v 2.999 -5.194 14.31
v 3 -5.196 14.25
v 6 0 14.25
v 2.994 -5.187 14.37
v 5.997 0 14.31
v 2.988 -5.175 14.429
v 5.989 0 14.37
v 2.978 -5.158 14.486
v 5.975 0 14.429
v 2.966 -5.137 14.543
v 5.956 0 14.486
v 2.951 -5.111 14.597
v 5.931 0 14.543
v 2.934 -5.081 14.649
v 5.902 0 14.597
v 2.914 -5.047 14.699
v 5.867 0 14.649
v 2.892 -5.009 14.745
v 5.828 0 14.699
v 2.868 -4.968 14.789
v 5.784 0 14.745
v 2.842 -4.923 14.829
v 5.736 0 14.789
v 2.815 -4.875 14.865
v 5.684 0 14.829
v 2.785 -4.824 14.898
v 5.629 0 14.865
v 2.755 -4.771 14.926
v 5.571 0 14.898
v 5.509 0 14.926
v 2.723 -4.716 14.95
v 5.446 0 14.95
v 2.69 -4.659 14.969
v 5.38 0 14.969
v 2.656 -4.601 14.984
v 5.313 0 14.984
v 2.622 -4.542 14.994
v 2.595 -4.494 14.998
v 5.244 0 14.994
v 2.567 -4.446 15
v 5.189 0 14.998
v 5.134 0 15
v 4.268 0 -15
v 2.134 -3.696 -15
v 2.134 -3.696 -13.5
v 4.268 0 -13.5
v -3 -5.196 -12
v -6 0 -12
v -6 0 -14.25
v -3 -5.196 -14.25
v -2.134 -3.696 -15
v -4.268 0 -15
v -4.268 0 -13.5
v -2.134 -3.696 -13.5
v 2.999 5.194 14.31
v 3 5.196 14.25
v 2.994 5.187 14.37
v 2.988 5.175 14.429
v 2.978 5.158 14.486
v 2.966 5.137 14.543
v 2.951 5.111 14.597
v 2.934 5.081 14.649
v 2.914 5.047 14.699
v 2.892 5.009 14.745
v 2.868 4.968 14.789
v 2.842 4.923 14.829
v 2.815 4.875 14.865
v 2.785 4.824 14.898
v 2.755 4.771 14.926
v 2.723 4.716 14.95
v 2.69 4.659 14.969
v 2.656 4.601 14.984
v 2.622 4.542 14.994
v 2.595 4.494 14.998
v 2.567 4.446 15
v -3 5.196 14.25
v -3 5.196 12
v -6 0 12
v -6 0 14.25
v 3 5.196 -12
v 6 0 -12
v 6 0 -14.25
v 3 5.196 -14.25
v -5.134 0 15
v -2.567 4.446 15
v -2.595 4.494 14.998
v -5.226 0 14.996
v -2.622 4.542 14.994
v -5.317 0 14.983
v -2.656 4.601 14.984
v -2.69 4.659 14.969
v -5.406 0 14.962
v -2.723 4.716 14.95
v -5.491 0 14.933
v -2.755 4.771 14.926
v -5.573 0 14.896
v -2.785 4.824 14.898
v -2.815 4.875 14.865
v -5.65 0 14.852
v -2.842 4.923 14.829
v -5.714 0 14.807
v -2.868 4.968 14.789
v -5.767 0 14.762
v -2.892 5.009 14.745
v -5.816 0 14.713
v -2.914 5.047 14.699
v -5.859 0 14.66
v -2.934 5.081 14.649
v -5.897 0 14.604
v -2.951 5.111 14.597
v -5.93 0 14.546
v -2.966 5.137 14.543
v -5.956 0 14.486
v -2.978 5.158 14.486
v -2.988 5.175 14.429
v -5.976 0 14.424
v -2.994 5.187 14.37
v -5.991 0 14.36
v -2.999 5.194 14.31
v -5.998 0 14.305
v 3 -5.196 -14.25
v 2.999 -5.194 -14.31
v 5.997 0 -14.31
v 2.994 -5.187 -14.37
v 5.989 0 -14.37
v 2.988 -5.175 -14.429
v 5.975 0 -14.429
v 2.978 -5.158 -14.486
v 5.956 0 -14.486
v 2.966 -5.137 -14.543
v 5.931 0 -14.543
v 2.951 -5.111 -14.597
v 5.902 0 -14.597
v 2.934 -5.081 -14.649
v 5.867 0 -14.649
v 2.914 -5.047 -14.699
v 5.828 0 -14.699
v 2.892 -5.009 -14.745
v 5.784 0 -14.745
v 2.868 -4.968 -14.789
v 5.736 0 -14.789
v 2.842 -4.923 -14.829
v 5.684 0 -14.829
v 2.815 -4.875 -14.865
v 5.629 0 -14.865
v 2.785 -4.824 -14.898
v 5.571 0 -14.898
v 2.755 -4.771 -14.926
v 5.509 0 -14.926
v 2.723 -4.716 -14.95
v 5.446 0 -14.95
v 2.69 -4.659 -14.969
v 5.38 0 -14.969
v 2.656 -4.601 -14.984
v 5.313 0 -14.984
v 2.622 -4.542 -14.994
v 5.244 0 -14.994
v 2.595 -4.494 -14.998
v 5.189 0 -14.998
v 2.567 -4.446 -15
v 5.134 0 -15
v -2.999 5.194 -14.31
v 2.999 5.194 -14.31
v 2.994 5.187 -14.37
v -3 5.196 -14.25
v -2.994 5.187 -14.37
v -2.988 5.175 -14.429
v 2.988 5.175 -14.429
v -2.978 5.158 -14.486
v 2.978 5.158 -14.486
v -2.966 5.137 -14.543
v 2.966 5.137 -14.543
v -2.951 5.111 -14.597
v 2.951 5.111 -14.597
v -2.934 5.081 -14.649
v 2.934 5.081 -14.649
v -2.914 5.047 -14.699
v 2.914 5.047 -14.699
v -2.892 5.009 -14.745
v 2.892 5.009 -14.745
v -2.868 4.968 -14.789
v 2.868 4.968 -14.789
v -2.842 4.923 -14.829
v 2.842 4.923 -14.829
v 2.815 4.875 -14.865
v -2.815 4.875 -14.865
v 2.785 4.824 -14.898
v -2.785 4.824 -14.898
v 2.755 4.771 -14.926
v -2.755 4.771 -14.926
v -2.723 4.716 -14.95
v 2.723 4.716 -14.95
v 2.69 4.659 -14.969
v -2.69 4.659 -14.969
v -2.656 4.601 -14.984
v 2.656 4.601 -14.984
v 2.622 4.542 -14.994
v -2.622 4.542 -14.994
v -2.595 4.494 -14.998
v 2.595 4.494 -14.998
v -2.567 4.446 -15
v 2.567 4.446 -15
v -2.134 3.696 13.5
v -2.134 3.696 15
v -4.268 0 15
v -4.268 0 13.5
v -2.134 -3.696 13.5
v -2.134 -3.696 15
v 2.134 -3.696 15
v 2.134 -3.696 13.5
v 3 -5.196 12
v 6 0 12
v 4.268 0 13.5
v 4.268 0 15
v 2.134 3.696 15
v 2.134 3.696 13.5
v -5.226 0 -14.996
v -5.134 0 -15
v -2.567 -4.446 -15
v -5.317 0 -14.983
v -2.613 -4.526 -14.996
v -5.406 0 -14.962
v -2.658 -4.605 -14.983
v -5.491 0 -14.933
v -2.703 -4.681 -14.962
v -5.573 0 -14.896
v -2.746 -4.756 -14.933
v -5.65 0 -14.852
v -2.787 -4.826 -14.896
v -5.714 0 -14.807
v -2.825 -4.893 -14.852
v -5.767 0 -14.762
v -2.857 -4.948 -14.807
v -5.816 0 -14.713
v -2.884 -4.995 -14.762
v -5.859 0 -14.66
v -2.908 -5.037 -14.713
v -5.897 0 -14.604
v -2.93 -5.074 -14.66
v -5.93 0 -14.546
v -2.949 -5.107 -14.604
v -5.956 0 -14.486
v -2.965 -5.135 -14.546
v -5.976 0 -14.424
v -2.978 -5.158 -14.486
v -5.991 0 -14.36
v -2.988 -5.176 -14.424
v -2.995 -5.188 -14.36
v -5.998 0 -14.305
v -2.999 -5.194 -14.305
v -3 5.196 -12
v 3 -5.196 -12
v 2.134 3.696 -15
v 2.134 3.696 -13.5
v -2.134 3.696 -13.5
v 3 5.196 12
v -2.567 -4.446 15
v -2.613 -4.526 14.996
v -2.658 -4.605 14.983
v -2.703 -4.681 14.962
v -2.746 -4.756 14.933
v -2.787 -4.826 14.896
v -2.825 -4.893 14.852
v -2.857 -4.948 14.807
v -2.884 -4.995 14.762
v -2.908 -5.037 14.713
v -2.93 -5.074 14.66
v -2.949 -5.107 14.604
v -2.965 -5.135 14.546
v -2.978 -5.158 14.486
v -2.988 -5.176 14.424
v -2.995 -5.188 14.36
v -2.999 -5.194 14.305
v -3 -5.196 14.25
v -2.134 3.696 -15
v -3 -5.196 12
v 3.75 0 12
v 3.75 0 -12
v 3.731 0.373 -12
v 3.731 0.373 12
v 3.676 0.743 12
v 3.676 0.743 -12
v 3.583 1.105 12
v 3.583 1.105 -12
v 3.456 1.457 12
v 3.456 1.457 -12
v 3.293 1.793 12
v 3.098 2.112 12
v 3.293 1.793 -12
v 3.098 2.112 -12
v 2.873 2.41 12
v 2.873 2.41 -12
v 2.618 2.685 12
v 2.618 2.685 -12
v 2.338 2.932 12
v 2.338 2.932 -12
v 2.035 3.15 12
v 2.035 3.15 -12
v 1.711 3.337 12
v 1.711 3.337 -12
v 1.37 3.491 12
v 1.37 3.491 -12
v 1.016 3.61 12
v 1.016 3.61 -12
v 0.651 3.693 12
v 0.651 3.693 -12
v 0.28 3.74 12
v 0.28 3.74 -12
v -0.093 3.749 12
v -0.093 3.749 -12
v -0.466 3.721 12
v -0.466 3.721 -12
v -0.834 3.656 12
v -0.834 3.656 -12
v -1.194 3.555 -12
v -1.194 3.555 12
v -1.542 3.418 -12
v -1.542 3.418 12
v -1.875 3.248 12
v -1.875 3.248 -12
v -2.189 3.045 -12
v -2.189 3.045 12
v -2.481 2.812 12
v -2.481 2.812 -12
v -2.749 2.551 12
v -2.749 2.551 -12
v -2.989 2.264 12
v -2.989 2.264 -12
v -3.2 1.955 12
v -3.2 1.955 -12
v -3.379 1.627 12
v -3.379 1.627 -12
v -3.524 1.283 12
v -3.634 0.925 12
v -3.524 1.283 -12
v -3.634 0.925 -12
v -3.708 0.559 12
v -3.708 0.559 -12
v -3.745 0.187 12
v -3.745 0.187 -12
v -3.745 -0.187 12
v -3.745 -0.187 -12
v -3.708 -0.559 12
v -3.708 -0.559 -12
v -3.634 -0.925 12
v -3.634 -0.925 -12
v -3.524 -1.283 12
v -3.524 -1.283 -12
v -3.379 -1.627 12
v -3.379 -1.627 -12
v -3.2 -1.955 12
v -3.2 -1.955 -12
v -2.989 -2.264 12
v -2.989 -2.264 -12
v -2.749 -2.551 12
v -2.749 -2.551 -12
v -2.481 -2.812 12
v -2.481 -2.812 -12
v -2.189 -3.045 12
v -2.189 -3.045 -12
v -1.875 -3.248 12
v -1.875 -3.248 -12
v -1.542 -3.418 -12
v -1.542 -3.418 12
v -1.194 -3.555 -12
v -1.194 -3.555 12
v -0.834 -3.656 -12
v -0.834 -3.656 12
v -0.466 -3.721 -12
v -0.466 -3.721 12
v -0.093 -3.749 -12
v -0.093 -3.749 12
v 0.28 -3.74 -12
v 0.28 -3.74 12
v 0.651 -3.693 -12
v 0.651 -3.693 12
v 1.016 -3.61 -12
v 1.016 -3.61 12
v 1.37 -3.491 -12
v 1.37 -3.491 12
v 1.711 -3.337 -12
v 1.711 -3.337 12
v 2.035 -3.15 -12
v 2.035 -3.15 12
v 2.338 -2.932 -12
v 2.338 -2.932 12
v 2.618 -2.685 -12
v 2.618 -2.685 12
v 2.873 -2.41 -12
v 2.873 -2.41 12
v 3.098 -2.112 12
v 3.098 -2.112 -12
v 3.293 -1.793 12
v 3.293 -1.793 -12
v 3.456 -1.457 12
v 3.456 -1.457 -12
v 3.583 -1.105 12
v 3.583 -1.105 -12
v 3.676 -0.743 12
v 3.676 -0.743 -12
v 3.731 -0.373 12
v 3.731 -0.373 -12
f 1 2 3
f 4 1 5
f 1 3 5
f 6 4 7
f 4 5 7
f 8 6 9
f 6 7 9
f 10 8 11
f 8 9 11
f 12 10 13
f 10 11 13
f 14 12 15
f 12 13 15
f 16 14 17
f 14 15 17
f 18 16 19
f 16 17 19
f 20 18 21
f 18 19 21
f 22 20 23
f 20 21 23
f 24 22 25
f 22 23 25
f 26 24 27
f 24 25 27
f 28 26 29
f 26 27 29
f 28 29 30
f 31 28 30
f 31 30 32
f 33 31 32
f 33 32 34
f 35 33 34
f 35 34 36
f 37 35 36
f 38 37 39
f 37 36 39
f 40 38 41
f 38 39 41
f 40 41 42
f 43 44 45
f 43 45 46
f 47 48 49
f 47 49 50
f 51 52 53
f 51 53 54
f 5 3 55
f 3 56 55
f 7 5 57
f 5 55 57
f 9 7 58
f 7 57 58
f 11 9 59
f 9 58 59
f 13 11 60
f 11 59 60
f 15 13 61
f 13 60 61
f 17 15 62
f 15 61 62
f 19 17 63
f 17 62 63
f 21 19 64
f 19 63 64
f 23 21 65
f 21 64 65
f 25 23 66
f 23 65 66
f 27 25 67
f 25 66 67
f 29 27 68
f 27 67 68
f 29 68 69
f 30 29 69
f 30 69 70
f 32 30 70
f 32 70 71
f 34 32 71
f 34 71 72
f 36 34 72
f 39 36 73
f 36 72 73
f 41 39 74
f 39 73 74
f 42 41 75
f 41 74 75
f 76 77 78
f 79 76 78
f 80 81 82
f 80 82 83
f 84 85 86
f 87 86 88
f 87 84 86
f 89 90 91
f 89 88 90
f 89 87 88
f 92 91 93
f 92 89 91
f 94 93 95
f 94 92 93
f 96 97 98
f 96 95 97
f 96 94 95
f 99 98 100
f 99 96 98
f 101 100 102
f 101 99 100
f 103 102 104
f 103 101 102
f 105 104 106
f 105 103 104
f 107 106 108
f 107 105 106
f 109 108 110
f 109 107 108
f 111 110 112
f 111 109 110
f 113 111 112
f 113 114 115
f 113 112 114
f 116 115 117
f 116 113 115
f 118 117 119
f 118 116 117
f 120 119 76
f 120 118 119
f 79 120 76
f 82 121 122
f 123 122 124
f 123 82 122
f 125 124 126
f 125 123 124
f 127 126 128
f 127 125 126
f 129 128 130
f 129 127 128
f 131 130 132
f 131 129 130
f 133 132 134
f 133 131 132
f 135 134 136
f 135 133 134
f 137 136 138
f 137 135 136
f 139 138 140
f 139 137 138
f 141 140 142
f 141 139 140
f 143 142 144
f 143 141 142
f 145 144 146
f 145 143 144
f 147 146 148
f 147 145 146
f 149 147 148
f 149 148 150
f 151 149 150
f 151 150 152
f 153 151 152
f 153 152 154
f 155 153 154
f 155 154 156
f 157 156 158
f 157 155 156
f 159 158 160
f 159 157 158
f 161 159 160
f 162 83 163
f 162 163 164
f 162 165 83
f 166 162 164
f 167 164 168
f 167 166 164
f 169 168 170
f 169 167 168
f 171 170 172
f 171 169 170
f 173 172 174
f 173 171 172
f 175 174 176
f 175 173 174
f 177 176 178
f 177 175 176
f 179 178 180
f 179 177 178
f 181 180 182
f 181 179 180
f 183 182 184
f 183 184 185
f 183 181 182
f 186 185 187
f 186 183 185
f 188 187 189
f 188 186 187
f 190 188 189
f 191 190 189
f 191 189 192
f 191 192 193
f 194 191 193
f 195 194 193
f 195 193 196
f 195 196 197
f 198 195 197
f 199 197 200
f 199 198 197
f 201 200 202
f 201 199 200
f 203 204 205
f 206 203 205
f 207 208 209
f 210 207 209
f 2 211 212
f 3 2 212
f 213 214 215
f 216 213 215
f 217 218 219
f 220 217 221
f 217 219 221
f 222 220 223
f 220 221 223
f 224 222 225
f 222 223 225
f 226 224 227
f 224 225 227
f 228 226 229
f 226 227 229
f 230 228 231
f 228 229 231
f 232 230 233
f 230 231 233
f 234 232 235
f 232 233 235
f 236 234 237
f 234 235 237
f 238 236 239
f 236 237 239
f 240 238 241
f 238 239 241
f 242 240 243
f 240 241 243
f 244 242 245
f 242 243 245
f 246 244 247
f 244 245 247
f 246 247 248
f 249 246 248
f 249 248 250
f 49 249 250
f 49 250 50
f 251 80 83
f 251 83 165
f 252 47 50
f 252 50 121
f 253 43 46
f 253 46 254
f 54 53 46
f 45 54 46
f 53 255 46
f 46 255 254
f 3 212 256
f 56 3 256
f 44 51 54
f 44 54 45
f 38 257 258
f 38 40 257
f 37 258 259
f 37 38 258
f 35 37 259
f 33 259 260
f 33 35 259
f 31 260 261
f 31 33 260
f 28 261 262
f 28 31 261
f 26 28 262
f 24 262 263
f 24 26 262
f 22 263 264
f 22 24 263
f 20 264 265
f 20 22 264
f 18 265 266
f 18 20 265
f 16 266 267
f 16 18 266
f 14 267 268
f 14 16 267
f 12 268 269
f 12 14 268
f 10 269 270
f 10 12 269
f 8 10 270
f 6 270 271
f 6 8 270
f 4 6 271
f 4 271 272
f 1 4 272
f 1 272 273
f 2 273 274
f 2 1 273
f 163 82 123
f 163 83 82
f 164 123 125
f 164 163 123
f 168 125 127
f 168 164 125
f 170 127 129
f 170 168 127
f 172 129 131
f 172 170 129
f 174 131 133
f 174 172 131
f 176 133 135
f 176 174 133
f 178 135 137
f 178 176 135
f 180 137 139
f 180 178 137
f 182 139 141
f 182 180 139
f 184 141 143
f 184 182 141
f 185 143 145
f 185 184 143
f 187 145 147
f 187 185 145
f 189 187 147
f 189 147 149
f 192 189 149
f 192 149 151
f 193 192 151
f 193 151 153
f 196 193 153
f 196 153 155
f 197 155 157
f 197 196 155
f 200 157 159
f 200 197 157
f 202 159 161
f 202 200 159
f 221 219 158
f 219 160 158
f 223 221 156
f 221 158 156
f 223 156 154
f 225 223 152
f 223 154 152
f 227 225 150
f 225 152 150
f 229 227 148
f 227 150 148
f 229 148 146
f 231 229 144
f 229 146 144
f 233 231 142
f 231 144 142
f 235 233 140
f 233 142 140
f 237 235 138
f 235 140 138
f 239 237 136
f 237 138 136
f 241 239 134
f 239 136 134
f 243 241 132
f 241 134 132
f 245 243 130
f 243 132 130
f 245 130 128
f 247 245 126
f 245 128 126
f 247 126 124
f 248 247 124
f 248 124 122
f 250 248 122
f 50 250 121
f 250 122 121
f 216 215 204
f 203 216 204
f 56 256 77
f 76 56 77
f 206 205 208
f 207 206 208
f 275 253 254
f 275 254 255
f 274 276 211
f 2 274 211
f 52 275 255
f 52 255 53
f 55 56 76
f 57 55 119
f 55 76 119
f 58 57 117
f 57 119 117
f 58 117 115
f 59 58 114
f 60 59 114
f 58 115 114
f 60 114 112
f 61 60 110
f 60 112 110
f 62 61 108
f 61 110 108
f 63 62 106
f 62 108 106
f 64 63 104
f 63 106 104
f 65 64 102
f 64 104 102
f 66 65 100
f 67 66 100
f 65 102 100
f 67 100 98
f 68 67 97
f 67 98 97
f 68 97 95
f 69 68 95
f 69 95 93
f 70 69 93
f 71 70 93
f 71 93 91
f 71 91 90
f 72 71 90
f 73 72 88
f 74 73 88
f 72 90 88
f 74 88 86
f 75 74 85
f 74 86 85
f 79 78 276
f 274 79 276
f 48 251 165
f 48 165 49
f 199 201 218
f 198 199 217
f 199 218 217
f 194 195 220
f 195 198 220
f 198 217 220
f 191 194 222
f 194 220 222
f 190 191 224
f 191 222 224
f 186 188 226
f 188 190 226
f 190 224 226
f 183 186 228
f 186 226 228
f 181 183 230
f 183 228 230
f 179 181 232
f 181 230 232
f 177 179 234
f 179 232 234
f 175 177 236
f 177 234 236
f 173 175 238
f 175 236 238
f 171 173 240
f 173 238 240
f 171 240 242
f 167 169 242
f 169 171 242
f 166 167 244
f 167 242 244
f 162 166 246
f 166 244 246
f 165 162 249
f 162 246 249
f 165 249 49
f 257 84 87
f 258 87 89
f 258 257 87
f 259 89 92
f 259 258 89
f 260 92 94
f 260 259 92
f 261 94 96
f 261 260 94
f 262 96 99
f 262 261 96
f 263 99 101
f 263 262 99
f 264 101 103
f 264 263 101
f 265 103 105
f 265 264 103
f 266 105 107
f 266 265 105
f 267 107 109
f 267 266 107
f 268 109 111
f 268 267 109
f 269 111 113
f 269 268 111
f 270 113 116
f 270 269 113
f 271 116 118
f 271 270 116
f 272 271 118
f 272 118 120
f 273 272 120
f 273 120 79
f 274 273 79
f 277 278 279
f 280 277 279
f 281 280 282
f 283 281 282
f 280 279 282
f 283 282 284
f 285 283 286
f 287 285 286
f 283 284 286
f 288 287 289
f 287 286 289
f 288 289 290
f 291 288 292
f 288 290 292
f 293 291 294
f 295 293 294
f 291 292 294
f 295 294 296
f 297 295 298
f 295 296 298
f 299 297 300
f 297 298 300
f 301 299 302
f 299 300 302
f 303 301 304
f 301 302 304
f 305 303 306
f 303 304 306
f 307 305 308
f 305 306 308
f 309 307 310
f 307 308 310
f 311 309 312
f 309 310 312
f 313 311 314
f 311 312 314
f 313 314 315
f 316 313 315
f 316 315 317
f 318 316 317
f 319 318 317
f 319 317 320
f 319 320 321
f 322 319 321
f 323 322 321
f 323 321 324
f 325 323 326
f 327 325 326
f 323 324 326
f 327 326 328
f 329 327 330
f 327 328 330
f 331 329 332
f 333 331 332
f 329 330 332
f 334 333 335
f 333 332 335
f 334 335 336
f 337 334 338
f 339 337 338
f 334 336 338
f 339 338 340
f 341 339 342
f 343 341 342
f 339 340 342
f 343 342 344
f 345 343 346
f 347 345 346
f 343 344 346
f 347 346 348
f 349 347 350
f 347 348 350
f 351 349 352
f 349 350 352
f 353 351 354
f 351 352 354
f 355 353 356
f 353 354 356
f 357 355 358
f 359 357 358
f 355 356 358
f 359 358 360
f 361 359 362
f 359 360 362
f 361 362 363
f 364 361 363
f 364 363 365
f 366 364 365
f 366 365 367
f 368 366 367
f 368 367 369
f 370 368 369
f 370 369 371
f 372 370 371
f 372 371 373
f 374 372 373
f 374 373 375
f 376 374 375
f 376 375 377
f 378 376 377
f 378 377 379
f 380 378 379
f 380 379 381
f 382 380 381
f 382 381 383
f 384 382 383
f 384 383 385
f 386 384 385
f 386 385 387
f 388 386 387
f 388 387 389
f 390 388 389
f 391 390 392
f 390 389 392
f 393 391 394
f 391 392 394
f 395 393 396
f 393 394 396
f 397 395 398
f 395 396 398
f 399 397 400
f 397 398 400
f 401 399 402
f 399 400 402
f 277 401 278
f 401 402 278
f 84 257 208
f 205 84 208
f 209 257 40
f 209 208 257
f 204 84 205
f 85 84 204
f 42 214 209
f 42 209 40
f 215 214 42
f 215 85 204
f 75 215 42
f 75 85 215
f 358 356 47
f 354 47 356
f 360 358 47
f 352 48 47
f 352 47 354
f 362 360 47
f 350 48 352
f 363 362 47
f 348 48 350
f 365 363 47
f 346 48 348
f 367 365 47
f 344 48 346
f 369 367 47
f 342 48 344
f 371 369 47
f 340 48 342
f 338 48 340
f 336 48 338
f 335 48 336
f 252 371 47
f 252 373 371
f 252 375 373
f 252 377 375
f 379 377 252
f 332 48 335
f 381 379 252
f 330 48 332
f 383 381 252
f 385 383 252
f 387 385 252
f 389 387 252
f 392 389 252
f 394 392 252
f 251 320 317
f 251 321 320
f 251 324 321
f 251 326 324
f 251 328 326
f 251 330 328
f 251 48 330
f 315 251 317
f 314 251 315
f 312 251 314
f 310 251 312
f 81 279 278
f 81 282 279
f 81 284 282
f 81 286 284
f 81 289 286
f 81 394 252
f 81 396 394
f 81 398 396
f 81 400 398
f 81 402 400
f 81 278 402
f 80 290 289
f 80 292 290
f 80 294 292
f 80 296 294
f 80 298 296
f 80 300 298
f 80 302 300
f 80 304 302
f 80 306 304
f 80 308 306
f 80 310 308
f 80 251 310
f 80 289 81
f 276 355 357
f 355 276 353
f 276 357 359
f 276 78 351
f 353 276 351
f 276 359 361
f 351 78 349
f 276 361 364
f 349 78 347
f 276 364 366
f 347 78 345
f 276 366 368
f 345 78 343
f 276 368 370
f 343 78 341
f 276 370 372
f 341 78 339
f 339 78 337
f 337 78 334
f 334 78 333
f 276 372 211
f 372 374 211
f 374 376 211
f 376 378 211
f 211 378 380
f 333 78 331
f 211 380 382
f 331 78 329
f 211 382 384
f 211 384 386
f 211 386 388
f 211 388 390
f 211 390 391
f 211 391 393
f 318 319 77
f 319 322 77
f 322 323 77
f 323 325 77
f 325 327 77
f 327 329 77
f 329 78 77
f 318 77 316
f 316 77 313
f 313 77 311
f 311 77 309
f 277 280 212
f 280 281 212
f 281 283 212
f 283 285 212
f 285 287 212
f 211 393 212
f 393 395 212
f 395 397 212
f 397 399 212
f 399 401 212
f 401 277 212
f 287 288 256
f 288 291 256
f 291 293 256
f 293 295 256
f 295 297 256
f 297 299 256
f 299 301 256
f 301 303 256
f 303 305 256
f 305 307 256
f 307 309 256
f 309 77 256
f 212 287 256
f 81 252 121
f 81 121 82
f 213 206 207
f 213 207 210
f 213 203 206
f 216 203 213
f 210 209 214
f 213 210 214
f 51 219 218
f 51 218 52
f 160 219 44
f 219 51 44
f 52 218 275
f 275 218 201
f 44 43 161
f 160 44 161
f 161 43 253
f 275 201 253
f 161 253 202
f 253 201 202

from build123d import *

# Parameters (mm, degrees)
BOSS_EXTRUDE1_DEPTH      = 2
BOSS_EXTRUDE1_DEPTH_BACK = 2
SKETCH1_R                = 0.625
BOSS_EXTRUDE2_DEPTH      = 0.5
FILLET1_R                = 0.125
CUT_EXTRUDE2_DEPTH       = 0.25
FILLET1_OF_MIRROR1_R     = 0.125
SCALE1_SCALE             = 6


with BuildPart() as part:
    # Sketch1 → Boss-Extrude1 (new, two sides: drawn at the far end of the back side and taken through both)
    with BuildSketch(Plane.XY.offset(-BOSS_EXTRUDE1_DEPTH_BACK)):
        Circle(SKETCH1_R)
    extrude(amount=BOSS_EXTRUDE1_DEPTH + BOSS_EXTRUDE1_DEPTH_BACK)

    # Sketch2 → Boss-Extrude2 (add)
    with BuildSketch(Plane.XY.offset(2)):
        Polygon((1, 0), (0.5, 0.866025404), (-0.5, 0.866025404), (-1, 0), (-0.5, -0.866025404), (0.5, -0.866025404), align=None)
    boss_extrude2 = extrude(amount=BOSS_EXTRUDE2_DEPTH)

    # Fillet1
    fillet1_edges = [part.edges().sort_by_distance(p)[0] for p in [
        (0.75, -0.433012702, 2.5),
        (0.75, 0.433012702, 2.5),
        (0, 0.866025404, 2.5),
        (-0.75, 0.433012702, 2.5),
        (-0.75, -0.433012702, 2.5),
        (0, -0.866025404, 2.5),
    ]]
    fillet(fillet1_edges, radius=FILLET1_R)

    # Sketch6 → Cut-Extrude2 (cut)
    with BuildSketch(Plane.XY.offset(2.5)):
        Polygon((-0.711324865, 0), (-0.355662433, -0.616025404), (0.355662433, -0.616025404), (0.711324865, 0), (0.355662433, 0.616025404), (-0.355662433, 0.616025404), align=None)
    cut_extrude2 = extrude(amount=-CUT_EXTRUDE2_DEPTH, mode=Mode.SUBTRACT)

    # Mirror1: Boss-Extrude2, Cut-Extrude2 across plane
    add(boss_extrude2.mirror(Plane.XY))
    add(cut_extrude2.mirror(Plane.XY), mode=Mode.SUBTRACT)

    # Fillet1 of Mirror1
    fillet1_of_mirror1_edges = [part.edges().sort_by_distance(p)[0] for p in [
        (0.75, -0.433012702, -2.5),
        (0.75, 0.433012702, -2.5),
        (0, 0.866025404, -2.5),
        (-0.75, 0.433012702, -2.5),
        (-0.75, -0.433012702, -2.5),
        (0, -0.866025404, -2.5),
    ]]
    fillet(fillet1_of_mirror1_edges, radius=FILLET1_OF_MIRROR1_R)


with BuildPart() as part_1:
    # Scale1: scaled about (0, 0, 0)
    add(part.part.scale(SCALE1_SCALE))


solid = part_1.part
